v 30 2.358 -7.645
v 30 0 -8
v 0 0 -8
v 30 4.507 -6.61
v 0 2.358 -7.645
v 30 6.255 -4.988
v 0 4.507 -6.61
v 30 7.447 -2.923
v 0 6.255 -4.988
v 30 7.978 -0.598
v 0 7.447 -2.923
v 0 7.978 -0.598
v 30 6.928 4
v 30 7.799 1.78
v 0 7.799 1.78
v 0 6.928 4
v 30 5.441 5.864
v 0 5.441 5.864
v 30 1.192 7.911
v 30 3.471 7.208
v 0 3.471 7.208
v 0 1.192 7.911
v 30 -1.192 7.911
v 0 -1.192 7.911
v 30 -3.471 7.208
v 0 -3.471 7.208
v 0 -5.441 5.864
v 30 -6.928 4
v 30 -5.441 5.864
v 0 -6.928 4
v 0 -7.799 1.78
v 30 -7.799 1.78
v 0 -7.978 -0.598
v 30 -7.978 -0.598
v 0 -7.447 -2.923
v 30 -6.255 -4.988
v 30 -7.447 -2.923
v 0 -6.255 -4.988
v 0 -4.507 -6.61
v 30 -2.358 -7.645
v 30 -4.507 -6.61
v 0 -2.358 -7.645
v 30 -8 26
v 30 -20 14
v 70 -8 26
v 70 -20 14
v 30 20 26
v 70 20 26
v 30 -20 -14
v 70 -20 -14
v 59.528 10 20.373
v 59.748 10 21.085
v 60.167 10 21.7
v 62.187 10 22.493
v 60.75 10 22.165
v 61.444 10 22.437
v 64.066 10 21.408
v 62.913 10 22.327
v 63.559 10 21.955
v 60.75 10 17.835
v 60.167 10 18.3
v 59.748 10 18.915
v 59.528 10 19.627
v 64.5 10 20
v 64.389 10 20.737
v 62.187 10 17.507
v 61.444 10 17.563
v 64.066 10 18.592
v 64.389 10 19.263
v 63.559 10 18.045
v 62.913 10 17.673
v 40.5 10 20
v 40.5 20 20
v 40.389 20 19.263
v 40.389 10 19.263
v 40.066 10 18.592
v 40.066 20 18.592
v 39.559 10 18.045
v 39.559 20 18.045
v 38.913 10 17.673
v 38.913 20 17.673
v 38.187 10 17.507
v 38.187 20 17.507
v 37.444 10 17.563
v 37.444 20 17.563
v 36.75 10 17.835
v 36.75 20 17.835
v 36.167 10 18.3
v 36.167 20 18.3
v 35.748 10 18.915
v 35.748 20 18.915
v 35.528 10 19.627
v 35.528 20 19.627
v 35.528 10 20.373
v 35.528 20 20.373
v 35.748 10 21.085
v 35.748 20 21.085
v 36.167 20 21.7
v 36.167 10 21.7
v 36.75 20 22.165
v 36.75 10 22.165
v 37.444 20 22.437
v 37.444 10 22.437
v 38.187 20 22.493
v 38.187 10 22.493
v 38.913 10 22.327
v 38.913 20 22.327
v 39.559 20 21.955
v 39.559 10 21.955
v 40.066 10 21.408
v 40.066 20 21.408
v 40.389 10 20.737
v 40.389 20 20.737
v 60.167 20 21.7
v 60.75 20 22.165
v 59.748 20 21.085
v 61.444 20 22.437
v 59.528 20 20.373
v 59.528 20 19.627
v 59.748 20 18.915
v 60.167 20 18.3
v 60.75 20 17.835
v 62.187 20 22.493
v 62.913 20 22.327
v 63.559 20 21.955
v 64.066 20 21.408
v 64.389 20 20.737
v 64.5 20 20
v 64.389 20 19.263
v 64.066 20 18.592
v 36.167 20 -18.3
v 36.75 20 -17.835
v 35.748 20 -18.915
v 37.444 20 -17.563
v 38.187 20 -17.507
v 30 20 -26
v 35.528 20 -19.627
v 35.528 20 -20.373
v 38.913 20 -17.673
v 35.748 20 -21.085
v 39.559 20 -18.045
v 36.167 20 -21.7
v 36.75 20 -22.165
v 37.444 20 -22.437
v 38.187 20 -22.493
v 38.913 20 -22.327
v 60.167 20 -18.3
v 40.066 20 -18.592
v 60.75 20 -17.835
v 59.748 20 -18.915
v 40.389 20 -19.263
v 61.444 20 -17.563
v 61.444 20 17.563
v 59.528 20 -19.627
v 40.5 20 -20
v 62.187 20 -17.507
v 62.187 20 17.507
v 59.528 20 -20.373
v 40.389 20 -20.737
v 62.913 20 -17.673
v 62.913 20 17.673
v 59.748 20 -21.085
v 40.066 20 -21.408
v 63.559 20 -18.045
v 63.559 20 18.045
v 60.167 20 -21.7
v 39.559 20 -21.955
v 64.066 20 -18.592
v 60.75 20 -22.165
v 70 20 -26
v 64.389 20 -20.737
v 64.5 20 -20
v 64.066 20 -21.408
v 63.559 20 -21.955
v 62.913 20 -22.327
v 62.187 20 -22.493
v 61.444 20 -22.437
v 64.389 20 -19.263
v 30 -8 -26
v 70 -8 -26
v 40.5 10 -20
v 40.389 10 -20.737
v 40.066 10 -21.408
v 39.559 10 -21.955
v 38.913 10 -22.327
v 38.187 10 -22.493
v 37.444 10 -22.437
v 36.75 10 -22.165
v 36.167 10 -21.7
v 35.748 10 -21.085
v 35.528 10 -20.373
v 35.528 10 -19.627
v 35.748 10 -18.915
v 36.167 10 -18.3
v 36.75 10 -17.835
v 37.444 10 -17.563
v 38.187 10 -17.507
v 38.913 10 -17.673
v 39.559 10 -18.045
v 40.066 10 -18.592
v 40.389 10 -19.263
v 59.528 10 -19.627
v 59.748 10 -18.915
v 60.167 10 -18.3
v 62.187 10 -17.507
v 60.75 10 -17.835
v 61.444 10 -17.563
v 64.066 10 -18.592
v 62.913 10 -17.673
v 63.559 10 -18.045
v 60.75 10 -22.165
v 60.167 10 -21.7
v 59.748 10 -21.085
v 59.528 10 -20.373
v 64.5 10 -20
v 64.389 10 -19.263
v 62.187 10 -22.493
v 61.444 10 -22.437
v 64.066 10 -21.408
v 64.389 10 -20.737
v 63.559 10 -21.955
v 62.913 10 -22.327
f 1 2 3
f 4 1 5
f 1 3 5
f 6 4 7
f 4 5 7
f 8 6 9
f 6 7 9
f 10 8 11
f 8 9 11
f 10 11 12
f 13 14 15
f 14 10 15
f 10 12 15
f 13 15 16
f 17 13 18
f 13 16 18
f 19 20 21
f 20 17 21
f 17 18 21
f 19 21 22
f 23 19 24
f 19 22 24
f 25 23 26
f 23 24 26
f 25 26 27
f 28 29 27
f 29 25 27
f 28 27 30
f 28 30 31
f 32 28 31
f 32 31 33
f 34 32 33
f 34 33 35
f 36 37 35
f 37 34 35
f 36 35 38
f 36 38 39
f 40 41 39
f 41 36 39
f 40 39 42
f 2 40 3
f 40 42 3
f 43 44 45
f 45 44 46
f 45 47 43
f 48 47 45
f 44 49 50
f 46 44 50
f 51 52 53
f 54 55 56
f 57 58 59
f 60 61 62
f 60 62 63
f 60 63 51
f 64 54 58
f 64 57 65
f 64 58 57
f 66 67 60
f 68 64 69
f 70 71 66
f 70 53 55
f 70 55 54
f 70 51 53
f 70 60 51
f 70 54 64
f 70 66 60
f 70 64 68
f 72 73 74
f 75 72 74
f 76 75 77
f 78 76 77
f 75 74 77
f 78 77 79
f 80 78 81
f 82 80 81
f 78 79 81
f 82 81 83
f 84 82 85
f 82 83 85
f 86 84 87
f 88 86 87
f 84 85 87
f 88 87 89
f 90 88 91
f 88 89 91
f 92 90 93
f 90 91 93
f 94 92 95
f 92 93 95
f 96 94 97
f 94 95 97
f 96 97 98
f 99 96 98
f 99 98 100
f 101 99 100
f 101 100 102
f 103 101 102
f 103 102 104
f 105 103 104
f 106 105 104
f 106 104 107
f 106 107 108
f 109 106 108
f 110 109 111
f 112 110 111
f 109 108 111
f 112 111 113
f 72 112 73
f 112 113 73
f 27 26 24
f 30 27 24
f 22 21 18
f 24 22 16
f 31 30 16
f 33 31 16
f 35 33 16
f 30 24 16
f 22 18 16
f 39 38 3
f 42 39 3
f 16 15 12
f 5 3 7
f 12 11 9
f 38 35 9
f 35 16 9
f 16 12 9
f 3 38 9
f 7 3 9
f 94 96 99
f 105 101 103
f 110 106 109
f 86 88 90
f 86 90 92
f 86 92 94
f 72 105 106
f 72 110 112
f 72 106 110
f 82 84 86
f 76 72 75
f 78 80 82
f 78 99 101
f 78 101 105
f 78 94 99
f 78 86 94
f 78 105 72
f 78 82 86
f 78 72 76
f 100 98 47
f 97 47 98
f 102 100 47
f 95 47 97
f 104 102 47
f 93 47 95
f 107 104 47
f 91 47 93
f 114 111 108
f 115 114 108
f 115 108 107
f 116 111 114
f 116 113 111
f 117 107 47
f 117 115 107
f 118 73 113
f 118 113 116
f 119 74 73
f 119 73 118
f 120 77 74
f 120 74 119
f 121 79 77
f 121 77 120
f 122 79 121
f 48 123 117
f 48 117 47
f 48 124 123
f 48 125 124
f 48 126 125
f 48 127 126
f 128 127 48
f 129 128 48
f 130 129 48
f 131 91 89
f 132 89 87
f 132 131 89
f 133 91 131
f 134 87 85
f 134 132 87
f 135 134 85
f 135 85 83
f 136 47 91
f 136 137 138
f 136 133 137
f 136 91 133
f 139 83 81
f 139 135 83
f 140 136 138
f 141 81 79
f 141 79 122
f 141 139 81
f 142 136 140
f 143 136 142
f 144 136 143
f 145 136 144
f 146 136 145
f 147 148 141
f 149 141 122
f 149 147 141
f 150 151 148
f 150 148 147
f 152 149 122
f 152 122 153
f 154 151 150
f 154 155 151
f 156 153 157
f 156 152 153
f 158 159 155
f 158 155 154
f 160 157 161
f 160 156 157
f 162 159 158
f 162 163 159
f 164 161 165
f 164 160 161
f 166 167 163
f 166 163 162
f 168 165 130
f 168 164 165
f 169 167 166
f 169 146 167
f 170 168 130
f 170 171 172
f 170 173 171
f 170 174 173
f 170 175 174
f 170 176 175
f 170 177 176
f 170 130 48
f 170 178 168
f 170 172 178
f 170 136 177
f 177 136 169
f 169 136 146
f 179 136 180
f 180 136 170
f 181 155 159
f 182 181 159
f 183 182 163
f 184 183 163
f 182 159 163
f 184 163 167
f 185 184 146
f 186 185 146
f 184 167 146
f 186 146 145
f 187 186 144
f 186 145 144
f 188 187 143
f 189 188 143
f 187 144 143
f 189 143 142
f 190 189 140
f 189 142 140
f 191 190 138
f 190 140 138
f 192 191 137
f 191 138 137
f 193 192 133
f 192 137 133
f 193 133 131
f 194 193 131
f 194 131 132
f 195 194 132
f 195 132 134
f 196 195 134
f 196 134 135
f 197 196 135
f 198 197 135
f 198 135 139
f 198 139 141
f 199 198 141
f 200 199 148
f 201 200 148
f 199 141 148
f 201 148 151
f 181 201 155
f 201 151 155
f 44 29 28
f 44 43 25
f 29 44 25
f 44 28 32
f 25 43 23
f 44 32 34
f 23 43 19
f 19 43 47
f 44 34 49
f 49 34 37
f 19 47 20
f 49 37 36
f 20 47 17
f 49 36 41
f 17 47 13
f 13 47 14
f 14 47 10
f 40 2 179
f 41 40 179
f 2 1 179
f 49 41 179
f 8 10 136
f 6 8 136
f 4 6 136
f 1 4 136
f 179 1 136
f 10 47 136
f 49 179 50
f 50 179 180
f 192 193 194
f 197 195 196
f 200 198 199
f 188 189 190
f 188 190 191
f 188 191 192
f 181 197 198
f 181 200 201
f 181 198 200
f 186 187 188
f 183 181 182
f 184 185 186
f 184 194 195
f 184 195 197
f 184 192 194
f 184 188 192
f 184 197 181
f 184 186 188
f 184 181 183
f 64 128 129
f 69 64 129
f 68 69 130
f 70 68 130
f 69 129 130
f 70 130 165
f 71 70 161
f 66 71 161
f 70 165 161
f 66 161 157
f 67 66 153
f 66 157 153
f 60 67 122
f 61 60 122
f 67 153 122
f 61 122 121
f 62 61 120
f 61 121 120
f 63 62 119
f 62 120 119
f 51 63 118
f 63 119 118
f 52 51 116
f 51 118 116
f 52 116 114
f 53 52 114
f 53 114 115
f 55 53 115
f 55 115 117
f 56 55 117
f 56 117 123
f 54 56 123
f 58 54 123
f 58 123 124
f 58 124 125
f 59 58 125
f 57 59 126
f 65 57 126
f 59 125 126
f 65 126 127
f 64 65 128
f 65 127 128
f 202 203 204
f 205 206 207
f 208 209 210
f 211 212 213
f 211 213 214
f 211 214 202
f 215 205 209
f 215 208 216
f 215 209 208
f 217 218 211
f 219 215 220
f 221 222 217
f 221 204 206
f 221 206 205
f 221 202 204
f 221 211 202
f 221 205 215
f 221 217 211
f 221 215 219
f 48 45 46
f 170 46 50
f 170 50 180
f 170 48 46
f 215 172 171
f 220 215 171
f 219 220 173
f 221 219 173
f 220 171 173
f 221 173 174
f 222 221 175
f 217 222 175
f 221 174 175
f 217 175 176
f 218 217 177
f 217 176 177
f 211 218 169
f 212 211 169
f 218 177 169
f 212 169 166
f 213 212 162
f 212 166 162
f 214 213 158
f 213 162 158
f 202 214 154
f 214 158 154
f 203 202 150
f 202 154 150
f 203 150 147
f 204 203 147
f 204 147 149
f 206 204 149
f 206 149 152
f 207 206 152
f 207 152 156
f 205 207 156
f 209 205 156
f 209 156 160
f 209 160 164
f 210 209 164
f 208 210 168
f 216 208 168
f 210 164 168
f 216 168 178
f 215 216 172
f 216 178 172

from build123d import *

# Parameters (mm, degrees)
SKETCH1_R           = 8
BOSS_EXTRUDE1_DEPTH = 150
SKETCH2_W           = 40
SKETCH2_H           = 52
BOSS_EXTRUDE2_DEPTH = 20
CHAMFER1_SIZE       = 12
SKETCH3_R           = 2.5
CUT_EXTRUDE1_DEPTH  = 10
SKETCH4_W           = 80.351410155
SKETCH4_H           = 105.979847546
CUT_EXTRUDE2_DEPTH  = 41


with BuildPart() as part:
    # Sketch1 → Boss-Extrude1 (new body)
    with BuildSketch(Plane(origin=(0, 0, 0), x_dir=(0, 0, -1), z_dir=(1, 0, 0))):
        Circle(SKETCH1_R)
    extrude(amount=BOSS_EXTRUDE1_DEPTH)

    # Sketch2 → Boss-Extrude2 (add, symmetric)
    with BuildSketch(Plane(origin=(0, 0, 0), x_dir=(1, 0, 0), z_dir=(0, 1, 0))):
        with Locations((50, 0)):
            Rectangle(SKETCH2_W, SKETCH2_H)
    extrude(amount=BOSS_EXTRUDE2_DEPTH, both=True)

    # Chamfer1
    chamfer1_edges = [part.edges().sort_by_distance(p)[0] for p in [
        (50, -20, 26),
        (50, -20, -26),
    ]]
    chamfer(chamfer1_edges, length=CHAMFER1_SIZE)

    # Sketch3 → Cut-Extrude1 (cut)
    with BuildSketch(Plane(origin=(0, 20, 0), x_dir=(1, 0, 0), z_dir=(0, 1, 0))):
        with Locations((38, 20)):
            Circle(SKETCH3_R)
        with Locations((62, 20)):
            Circle(SKETCH3_R)
        with Locations((38, -20)):
            Circle(SKETCH3_R)
        with Locations((62, -20)):
            Circle(SKETCH3_R)
    extrude(amount=-CUT_EXTRUDE1_DEPTH, mode=Mode.SUBTRACT)

    # Sketch4 → Cut-Extrude2 (cut, through all)
    with BuildSketch(Plane(origin=(0, 20, 0), x_dir=(1, 0, 0), z_dir=(0, 1, 0))):
        with Locations((110.175705077, -18.887237422)):
            Rectangle(SKETCH4_W, SKETCH4_H)
    extrude(amount=-CUT_EXTRUDE2_DEPTH, mode=Mode.SUBTRACT)


solid = part.part
